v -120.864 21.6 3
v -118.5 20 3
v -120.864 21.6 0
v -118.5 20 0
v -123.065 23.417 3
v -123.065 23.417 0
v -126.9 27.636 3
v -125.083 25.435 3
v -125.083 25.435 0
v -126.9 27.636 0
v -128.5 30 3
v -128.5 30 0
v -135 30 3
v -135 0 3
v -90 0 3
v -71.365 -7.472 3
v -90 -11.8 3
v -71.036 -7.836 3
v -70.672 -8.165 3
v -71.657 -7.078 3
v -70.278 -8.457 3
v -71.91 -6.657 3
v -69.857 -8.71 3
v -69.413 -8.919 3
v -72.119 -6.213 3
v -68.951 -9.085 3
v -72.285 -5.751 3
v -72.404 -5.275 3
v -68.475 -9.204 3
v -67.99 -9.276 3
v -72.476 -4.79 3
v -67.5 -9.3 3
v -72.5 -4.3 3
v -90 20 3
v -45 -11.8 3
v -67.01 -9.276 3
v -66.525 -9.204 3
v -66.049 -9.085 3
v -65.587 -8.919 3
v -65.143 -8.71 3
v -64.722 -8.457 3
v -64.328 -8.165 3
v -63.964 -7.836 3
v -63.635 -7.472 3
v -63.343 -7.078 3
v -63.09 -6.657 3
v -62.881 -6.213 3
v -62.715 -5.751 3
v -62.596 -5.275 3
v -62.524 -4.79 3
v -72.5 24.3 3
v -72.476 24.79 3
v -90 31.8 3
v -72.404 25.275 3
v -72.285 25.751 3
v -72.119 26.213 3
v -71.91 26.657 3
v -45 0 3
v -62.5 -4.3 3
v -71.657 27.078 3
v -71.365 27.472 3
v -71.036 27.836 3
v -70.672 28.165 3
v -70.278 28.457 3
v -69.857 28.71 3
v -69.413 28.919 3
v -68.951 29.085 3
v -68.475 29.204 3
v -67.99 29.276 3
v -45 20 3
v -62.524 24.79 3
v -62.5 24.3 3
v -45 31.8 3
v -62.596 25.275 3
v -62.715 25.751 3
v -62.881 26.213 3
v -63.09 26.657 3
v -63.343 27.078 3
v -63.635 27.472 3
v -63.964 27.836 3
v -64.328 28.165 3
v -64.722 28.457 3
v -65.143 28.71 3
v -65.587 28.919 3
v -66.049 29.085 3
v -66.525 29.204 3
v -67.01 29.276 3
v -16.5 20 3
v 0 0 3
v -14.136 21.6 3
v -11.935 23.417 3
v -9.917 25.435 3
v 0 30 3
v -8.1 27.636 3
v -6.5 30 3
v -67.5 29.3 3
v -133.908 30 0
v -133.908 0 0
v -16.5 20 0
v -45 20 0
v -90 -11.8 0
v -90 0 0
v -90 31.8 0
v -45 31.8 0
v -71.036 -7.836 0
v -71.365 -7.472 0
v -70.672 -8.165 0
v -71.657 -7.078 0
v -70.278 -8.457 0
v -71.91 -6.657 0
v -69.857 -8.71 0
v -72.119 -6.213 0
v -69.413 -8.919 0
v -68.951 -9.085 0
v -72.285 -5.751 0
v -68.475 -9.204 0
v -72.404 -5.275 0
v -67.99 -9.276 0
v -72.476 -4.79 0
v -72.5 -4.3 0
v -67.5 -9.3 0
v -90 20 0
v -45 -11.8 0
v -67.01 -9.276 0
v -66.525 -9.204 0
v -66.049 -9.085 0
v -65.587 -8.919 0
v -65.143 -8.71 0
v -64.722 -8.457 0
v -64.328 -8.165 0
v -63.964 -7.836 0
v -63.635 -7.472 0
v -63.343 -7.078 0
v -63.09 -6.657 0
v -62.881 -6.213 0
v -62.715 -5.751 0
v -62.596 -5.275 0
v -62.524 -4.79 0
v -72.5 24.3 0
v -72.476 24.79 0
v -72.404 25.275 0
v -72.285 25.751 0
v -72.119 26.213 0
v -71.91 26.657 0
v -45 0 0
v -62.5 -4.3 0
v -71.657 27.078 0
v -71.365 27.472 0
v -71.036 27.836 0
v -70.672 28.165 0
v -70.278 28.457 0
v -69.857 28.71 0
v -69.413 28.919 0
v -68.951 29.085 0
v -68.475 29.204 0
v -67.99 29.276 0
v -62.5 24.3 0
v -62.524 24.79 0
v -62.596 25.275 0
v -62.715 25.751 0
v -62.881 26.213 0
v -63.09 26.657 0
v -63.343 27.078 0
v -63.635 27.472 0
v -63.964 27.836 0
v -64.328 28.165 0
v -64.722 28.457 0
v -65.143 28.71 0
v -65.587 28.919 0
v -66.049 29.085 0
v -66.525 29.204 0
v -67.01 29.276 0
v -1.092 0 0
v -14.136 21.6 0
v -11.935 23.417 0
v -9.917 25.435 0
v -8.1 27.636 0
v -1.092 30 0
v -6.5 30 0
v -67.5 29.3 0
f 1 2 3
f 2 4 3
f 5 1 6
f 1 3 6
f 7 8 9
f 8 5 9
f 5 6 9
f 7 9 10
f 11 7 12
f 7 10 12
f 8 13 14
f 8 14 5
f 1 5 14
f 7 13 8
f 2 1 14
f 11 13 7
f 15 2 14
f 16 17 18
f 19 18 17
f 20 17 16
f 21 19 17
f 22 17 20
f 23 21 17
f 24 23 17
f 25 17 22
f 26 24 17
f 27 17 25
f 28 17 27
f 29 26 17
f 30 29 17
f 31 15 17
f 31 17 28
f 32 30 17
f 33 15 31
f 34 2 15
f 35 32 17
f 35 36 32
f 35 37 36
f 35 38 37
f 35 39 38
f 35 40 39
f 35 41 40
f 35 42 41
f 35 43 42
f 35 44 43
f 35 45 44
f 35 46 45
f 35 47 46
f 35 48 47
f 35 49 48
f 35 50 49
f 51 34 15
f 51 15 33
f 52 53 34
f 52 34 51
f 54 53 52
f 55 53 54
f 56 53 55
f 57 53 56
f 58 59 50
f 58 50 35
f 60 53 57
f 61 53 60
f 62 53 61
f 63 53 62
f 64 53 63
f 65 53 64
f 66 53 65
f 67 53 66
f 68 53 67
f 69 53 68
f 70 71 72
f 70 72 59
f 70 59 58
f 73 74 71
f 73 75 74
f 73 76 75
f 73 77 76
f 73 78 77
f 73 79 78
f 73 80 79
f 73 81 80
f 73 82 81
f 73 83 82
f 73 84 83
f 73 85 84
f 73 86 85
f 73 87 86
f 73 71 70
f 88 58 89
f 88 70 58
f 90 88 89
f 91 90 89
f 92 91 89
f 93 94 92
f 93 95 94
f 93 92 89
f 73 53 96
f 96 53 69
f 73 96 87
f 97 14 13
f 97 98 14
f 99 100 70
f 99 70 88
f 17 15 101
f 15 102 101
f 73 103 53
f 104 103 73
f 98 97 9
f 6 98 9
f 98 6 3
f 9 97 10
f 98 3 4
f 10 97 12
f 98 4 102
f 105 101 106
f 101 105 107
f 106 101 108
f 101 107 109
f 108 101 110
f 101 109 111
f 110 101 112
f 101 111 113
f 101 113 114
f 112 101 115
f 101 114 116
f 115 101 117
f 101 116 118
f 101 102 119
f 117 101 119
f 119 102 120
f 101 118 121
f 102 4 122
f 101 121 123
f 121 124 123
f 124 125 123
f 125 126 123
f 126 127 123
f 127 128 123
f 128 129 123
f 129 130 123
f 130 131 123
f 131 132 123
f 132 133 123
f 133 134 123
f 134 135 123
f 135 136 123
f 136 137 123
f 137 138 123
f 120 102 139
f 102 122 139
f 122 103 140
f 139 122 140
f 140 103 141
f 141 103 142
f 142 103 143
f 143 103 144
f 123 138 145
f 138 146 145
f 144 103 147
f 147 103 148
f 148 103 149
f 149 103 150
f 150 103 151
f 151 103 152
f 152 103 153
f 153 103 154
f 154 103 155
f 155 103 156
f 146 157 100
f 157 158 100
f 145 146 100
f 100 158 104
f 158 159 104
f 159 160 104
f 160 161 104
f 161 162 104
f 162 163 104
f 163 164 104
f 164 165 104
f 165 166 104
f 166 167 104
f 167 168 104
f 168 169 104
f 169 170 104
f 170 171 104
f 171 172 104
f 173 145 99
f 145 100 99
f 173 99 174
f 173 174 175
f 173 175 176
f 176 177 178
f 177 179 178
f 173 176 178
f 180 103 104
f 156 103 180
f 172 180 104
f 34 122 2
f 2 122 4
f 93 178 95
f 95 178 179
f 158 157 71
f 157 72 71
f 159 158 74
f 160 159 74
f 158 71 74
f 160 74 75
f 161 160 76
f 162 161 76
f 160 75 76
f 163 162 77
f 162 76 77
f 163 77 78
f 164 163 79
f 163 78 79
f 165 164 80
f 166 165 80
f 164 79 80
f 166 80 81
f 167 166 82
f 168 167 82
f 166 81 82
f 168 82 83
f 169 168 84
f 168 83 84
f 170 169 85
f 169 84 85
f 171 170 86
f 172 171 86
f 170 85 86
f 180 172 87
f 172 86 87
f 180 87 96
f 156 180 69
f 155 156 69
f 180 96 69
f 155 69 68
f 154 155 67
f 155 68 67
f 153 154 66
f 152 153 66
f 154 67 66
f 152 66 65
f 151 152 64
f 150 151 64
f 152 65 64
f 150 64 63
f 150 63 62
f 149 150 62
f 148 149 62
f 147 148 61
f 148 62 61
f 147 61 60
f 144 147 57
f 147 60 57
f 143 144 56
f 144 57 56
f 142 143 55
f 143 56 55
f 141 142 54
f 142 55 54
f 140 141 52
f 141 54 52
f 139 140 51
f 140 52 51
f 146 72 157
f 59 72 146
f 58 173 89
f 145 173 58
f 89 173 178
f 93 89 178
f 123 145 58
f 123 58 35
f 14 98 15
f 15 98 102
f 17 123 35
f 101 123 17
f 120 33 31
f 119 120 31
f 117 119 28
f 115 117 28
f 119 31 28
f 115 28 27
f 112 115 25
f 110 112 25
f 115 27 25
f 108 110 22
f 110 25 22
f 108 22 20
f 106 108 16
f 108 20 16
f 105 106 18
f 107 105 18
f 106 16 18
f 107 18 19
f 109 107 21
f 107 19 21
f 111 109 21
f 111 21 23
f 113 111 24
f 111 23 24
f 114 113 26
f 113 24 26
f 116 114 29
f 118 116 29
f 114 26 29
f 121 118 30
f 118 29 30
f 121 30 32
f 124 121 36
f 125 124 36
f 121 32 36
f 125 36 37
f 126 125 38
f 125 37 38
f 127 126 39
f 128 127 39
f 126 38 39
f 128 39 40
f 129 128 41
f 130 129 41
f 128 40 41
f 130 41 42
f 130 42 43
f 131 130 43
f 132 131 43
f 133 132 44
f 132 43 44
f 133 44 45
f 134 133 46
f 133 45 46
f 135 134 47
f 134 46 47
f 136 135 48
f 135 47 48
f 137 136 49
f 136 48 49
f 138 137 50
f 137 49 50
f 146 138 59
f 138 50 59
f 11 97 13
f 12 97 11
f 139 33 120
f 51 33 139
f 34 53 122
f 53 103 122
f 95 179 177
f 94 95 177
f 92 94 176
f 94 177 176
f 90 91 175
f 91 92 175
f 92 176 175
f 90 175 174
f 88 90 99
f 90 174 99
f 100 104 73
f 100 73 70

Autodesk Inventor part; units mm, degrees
ref_plane "YZ Plane" through (0, 0, 0) normal (1, 0, 0) x (0, 1, 0)
ref_plane "XZ Plane" through (0, 0, 0) normal (0, 1, 0) x (-1, 0, 0)
ref_plane "XY Plane" through (0, 0, 0) normal (0, 0, 1) x (1, 0, 0)
sketch "Sketch1" plane through (0, 0, 0) normal (0, 0, 1) x (1, 0, 0)
  line L0 (0, 0) -> (0, 30)
  line L1 (0, 30) -> (-6.5, 30)
  line L2 (0, 0) -> (-45, 0)
  line L3 (-45, 0) -> (-45, -11.8)
  line L4 (-45, -11.8) -> (-67.5, -11.8)
  line L5 (-67.5, -11.8) -> (-67.5, 31.8)
  line L6 (-67.5, 31.8) -> (-45, 31.8)
  line L7 (-45, 31.8) -> (-45, 20)
  line L8 (-45, 20) -> (-16.5, 20)
  arc A0 (-16.5, 20) -> (-6.5, 30) centre (-32.1155, 45.6155) ccw
  line L9 (-135, 0) -> (-135, 30)
  line L10 (-135, 30) -> (-128.5, 30)
  line L11 (-135, 0) -> (-90, 0)
  line L12 (-90, 0) -> (-90, -11.8)
  line L13 (-90, -11.8) -> (-67.5, -11.8)
  line L14 (-67.5, 31.8) -> (-90, 31.8)
  line L15 (-90, 31.8) -> (-90, 20)
  line L16 (-90, 20) -> (-118.5, 20)
  arc A1 (-128.5, 30) -> (-118.5, 20) centre (-102.8845, 45.6155) ccw
  dimension "d16" = 10
  dimension "d17" = 30
  dimension "d18" = 6.5
  dimension "d19" = 10
  dimension "d20" = 20
  dimension "d23" = 45
  dimension "d24" = 135
  dimension "d25" = 43.6
extrude "Body" add sketch "Sketch1" along normal blind 3
sketch "Sketch2" plane through (0, 0, 3) normal (0, 0, 1) x (1, 0, 0)
  line L0 (-72.5, -4.3) -> (-72.5, 24.3)
  arc A0 (-62.5, 24.3) -> (-72.5, 24.3) centre (-67.5, 24.3) ccw
  line L1 (-62.5, 24.3) -> (-62.5, -4.3)
  arc A1 (-72.5, -4.3) -> (-62.5, -4.3) centre (-67.5, -4.3) ccw
  line L2 (-16.5, 20) -> (-45, 20) projected
  line L3 (0, 0) -> (0, 30) projected
  line L4 (-45, -11.8) -> (-45, 0) projected
  line L5 (-45, 20) -> (-45, 0)
  line L6 (-131.212, 10) -> (6.3115, 10)
  point P0 (-62.5, 10)
  point P1 (-45, 10)
  dimension "d28" = 28.6
  dimension "d30" = 62.5
  dimension "d31" = 10
extrude "Extrusion2" cut sketch "Sketch2" against normal through all
draft "FaceDraft1" angle -20 pull direction (0, 0, 1) faces at (0, 10, 1) fixed edges at (0, 15, 3)
draft "FaceDraft2" angle -20 pull direction (0, 0, 1) faces at (-135, 20, 1) fixed edges at (-135, 15, 3)
equation "\"d16\" = deslizador_interruptor_largo"
equation "\"d17\" = deslizador_interruptor_angulo"
equation "\"d18\" = deslizador_interruptor_separacion"
equation "\"d19\" = deslizador_interruptor_ancho"
equation "\"d20\" = deslizador_ancho"
equation "\"d23\" = deslizador_apoyo_largo"
equation "\"d24\" = deslizador_largo"
equation "\"d25\" = deslizador_ancho + 2 * deslizador_apoyo_ancho"
equation "\"d26\" = deslizador_grosor"
equation "\"d28\" = deslizador_eje_movimiento"
equation "\"d30\" = deslizador_eje_separacion"
equation "\"d31\" = deslizador_eje_ancho"
equation "\"d34\" = tirador_deslizador_agarre"
equation "\"d35\" = tirador_deslizador_agarre"
equation "\"deslizador_interruptor_largo\" = 10"
equation "\"deslizador_interruptor_angulo\" = 30"
equation "\"deslizador_interruptor_separacion\" = 6.5"
equation "\"deslizador_interruptor_ancho\" = 10"
equation "\"deslizador_ancho\" = 20"
equation "\"deslizador_apoyo_largo\" = 45"
equation "\"deslizador_largo\" = 135"
equation "\"deslizador_apoyo_ancho\" = 11.8"
equation "\"deslizador_grosor\" = 3"
equation "\"deslizador_eje_movimiento\" = 28.6"
equation "\"deslizador_eje_separacion\" = 62.5"
equation "\"deslizador_eje_ancho\" = 10"
equation "\"tirador_deslizador_agarre\" = -20deg"
properties part number "Deslizador"
